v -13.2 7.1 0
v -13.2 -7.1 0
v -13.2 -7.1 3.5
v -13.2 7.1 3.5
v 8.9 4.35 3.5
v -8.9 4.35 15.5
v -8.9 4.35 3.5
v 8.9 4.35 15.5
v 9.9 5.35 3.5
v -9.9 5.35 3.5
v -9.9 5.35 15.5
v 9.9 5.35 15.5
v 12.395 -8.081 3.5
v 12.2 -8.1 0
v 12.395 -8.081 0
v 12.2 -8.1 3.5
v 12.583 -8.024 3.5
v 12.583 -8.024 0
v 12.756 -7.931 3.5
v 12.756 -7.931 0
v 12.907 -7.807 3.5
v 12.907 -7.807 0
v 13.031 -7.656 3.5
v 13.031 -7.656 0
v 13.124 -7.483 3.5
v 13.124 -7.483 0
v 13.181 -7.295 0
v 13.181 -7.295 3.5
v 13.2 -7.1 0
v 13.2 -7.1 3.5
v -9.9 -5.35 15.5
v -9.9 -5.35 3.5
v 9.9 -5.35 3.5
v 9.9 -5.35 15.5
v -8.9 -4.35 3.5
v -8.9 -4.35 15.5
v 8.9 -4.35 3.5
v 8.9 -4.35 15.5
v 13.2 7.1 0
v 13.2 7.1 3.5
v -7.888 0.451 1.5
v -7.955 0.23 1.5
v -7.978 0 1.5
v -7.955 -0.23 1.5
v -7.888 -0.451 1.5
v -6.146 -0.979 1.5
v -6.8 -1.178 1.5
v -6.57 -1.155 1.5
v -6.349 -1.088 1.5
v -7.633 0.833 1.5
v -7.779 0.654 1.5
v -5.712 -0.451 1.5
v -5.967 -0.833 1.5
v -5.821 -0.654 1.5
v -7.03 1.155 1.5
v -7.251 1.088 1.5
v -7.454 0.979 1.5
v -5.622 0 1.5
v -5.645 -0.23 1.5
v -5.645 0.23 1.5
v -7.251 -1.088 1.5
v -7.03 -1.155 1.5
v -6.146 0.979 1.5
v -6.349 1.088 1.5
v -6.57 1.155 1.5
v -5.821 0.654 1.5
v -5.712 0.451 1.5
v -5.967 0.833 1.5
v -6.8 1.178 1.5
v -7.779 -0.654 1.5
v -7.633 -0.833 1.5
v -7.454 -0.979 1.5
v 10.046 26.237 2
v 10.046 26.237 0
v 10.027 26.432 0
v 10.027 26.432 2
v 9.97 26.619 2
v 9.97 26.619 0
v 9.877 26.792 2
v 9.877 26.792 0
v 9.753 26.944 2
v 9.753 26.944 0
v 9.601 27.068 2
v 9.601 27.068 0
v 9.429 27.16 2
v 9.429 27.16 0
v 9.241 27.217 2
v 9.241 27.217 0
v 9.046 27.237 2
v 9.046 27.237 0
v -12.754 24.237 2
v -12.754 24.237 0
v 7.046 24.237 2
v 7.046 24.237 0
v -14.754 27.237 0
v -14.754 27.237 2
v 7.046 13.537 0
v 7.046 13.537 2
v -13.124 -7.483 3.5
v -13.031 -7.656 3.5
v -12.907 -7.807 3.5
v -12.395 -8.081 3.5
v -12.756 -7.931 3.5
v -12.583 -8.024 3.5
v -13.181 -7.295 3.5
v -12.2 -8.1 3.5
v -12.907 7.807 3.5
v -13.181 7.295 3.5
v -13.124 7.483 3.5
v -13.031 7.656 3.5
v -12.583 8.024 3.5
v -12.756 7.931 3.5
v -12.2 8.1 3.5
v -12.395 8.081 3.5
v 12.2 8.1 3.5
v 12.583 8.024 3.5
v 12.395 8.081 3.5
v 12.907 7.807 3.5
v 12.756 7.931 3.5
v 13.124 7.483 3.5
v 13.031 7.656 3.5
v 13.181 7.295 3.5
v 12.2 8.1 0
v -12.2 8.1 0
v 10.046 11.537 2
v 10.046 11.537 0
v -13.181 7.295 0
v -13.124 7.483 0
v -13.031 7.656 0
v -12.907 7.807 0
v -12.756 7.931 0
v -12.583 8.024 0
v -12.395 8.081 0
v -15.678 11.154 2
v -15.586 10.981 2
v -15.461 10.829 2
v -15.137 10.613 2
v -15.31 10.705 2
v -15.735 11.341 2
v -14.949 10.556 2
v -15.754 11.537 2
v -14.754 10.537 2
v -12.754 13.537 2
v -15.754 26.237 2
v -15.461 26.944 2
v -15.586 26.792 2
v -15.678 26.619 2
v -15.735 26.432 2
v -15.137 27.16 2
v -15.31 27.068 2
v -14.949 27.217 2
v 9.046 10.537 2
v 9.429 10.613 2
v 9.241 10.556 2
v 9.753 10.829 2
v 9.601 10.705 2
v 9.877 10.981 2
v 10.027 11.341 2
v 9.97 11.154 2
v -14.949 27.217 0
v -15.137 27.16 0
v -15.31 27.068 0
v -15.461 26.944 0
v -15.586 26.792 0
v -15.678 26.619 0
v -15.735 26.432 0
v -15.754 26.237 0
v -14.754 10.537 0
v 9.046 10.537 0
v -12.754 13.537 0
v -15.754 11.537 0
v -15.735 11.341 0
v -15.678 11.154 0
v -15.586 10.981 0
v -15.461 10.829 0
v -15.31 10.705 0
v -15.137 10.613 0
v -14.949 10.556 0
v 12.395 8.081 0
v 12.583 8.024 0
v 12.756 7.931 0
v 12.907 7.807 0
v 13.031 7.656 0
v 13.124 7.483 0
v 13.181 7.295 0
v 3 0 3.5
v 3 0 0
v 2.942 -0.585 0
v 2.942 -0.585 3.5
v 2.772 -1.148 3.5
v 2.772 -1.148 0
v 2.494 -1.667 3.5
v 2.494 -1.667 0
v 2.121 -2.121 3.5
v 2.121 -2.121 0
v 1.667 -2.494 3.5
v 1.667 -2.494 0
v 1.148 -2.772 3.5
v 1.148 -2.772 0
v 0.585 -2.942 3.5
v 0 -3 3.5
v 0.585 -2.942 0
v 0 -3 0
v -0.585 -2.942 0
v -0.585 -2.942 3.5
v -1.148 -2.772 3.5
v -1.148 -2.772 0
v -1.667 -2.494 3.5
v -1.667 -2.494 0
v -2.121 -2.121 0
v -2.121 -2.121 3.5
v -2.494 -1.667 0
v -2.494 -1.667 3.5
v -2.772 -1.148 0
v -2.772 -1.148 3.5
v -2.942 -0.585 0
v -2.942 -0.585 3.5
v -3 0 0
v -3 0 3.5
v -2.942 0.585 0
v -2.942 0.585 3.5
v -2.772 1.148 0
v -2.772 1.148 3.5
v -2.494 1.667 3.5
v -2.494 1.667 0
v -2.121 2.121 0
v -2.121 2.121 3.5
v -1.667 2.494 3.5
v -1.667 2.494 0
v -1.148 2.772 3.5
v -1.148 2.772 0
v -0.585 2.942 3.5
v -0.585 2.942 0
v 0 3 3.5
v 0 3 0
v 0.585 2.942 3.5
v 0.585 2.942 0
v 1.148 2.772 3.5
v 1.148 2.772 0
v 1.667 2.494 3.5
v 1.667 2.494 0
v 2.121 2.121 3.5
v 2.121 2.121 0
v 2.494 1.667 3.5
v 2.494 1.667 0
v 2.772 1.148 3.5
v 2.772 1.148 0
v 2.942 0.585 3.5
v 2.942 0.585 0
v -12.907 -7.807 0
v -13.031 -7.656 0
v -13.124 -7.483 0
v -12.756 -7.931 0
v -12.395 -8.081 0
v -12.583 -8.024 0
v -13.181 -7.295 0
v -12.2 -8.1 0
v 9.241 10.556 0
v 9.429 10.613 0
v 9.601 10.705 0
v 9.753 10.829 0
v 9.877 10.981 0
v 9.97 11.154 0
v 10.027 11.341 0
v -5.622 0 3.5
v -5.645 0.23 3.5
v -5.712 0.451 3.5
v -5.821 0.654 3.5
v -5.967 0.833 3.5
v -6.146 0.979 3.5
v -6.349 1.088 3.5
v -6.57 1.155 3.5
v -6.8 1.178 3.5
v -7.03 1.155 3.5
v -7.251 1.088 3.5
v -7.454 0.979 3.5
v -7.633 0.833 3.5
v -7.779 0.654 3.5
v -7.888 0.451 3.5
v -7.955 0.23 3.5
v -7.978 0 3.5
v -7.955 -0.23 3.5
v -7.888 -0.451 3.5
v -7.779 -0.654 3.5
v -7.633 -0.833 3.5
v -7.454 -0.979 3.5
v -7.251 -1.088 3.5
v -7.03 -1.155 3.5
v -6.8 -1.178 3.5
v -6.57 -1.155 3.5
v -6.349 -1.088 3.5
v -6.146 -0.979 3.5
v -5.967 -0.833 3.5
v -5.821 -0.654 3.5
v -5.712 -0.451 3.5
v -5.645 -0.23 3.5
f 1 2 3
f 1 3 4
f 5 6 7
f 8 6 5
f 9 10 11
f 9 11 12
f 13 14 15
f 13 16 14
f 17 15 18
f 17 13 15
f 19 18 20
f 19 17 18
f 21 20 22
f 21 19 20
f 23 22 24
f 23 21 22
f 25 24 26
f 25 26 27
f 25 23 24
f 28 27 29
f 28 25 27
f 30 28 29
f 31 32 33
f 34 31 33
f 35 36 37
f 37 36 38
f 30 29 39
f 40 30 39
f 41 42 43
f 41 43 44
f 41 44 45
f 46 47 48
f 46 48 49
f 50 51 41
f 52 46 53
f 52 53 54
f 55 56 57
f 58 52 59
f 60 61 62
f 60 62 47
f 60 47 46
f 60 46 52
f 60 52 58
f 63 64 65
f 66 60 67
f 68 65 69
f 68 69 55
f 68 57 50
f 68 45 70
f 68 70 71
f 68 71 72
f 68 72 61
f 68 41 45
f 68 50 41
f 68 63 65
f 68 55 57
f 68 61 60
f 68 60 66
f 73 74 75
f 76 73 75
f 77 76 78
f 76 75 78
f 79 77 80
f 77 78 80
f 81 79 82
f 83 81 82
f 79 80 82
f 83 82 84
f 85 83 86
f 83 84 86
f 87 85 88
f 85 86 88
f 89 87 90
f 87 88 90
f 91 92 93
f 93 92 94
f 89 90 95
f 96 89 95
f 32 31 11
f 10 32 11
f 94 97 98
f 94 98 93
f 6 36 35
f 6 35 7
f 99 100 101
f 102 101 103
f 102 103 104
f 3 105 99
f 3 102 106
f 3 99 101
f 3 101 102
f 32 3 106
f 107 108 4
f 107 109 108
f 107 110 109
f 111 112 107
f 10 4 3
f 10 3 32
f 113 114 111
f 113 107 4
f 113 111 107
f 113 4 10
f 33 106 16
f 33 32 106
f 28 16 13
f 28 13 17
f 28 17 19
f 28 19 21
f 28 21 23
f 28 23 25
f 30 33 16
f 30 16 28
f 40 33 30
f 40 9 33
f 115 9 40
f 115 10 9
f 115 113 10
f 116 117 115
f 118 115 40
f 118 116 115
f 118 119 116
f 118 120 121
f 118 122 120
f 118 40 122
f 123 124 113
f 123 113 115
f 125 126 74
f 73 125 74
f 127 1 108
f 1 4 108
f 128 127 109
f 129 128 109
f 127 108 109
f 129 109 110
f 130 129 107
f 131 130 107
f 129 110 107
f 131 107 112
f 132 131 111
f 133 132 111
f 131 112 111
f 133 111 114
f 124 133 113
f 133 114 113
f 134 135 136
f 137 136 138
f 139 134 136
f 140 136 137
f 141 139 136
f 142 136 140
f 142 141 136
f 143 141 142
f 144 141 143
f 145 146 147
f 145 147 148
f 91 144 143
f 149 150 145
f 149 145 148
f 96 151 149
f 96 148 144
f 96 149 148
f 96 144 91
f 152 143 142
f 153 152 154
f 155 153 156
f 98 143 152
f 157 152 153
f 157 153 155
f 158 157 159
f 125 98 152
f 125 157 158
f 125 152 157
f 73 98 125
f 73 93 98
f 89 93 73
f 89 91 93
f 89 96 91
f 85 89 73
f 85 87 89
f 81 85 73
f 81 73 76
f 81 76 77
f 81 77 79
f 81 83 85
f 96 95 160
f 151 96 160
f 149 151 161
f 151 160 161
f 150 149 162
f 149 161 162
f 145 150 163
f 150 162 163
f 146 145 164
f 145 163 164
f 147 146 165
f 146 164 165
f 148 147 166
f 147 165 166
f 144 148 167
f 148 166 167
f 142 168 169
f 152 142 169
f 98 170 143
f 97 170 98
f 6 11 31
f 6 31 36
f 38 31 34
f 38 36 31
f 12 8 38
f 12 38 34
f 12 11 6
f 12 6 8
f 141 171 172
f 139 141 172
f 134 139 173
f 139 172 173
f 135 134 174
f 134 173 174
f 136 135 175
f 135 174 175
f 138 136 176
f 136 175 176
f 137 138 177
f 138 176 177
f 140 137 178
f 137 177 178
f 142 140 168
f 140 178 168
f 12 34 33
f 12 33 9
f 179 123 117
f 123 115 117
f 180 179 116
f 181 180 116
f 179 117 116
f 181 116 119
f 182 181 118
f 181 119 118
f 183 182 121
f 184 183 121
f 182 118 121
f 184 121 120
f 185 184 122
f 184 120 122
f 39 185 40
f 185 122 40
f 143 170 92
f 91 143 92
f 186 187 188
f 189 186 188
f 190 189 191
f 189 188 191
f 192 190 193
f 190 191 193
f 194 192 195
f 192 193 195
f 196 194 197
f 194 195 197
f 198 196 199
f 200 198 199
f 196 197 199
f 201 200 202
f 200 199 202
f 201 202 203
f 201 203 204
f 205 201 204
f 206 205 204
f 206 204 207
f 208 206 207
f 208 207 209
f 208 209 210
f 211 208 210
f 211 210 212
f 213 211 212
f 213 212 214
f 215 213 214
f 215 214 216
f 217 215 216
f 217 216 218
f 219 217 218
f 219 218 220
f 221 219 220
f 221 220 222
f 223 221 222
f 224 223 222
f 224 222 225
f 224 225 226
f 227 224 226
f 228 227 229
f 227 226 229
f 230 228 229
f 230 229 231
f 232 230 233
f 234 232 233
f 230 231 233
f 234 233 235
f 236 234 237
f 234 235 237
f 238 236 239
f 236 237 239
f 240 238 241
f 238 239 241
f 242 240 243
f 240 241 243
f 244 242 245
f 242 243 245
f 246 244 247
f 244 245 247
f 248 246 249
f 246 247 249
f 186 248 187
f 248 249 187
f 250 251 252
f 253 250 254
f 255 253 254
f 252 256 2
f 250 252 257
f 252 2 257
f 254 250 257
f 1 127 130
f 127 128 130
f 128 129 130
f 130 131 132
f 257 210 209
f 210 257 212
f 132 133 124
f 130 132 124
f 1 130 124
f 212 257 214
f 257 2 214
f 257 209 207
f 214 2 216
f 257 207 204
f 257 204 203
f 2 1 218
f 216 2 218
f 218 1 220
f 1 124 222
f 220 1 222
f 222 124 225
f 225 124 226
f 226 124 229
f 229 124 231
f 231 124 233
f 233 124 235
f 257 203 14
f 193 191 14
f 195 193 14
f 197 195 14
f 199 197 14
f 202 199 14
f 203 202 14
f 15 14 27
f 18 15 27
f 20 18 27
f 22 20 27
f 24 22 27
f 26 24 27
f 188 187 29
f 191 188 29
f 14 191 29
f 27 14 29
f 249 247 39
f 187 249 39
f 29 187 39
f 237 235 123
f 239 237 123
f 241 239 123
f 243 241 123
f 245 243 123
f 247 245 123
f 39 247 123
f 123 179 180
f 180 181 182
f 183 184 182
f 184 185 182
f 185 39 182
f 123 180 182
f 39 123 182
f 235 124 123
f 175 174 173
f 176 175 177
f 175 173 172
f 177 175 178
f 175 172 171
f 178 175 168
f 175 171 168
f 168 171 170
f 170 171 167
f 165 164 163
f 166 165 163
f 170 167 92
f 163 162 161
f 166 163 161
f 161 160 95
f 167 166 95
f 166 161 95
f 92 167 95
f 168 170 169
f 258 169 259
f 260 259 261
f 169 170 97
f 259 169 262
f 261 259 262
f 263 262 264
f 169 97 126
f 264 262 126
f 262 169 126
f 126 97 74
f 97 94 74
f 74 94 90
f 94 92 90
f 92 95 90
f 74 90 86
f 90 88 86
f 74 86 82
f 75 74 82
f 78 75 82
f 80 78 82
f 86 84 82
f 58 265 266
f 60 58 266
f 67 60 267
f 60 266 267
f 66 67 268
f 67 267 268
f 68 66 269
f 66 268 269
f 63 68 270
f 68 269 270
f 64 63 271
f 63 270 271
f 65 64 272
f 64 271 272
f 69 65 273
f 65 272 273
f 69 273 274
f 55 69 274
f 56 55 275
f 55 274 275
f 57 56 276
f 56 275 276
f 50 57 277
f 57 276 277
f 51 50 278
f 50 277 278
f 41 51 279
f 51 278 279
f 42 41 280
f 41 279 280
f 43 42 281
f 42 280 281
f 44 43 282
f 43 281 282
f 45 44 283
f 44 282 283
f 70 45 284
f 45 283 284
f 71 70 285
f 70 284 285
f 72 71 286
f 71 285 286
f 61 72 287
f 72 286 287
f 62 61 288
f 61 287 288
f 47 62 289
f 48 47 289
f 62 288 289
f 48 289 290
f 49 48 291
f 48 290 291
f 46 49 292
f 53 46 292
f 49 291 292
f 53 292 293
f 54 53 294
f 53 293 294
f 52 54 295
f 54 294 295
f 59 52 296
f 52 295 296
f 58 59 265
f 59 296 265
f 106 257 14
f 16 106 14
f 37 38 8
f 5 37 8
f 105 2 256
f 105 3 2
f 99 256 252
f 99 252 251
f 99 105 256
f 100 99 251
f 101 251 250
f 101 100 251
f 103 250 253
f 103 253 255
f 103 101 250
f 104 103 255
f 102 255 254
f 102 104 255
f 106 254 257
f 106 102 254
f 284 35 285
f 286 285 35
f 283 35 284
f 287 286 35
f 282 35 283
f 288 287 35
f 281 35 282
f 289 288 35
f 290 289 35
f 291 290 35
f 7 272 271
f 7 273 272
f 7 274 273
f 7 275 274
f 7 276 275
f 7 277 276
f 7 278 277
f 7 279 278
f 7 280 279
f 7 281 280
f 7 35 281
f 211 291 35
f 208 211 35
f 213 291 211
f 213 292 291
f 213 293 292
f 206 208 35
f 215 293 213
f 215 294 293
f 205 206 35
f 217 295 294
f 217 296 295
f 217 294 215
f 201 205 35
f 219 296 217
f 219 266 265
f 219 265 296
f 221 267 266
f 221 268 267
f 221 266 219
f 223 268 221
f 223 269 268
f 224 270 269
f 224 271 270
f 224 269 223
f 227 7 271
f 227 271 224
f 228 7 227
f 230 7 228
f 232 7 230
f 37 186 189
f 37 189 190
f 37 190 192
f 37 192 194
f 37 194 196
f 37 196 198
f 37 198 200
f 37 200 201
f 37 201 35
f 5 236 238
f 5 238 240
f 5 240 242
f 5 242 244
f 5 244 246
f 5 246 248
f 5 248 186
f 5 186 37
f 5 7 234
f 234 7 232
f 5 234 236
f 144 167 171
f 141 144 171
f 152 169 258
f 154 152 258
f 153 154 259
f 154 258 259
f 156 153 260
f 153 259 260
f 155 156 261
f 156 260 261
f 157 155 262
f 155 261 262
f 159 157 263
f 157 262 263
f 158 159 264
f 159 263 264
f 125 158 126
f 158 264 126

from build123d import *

# Parameters (mm, degrees)
F0_W       = 26.4
F0_H       = 16.2
F1_DEPTH   = 3.5
F2_W       = 19.8
F2_H       = 10.7
F3_DEPTH   = 12
F4_W       = 17.8
F4_H       = 8.7
F5_DEPTH   = 12
F6_R       = 3
F7_DEPTH   = 25
F8_R       = 1
F1_FACE1_R = 3
F9_R       = 1.1777908887
F10_DEPTH  = 2
F11_W      = 19.8
F11_H      = 10.7
F12_DEPTH  = 2


with BuildPart() as f1:
    # F0 (on Top) → F1 (new body)
    with BuildSketch(Plane.XY):
        Rectangle(F0_W, F0_H)
    extrude(amount=F1_DEPTH)

    # F2 (on face) → F3 (join)
    with BuildSketch(Plane.XY.offset(3.5)):
        Rectangle(F2_W, F2_H)
    extrude(amount=F3_DEPTH)

    # F4 (on face) → F5 (cut)
    with BuildSketch(Plane.XY.offset(15.5)):
        Rectangle(F4_W, F4_H)
    extrude(amount=-F5_DEPTH, mode=Mode.SUBTRACT)

    # F6 (on face) → F7 (cut)
    with BuildSketch(Plane(origin=(0, 0, 0), x_dir=(1, 0, 0), z_dir=(0, 0, -1))):
        Circle(F6_R)
    extrude(amount=-F7_DEPTH, mode=Mode.SUBTRACT)

    # F8
    f8_edges = [f1.edges().sort_by_distance(p)[0] for p in [
        (13.2, 8.1, 1.75),
        (13.2, -8.1, 1.75),
        (-13.2, 8.1, 1.75),
        (-13.2, -8.1, 1.75),
    ]]
    fillet(f8_edges, radius=F8_R)

    # F1_face1 (on face) + F9 (on face) → F10 (cut)
    with BuildSketch(Plane(origin=(0, 0, 0), x_dir=(1, 0, 0), z_dir=(0, 0, -1))):
        with BuildLine():
            Line((-12.2, -8.1), (12.2, -8.1))
            ThreePointArc((12.2, -8.1), (12.9071067812, -7.8071067812), (13.2, -7.1))
            Line((13.2, -7.1), (13.2, 7.1))
            ThreePointArc((13.2, 7.1), (12.9071067812, 7.8071067812), (12.2, 8.1))
            Line((12.2, 8.1), (-12.2, 8.1))
            ThreePointArc((-12.2, 8.1), (-12.9071067812, 7.8071067812), (-13.2, 7.1))
            Line((-13.2, 7.1), (-13.2, -7.1))
            ThreePointArc((-13.2, -7.1), (-12.9071067812, -7.8071067812), (-12.2, -8.1))
        make_face()
        Circle(F1_FACE1_R, mode=Mode.SUBTRACT)
    with BuildSketch(Plane.XY.offset(3.5)):
        with Locations((-6.8, 0)):
            Circle(F9_R)
    extrude(amount=F10_DEPTH, dir=(0, 0, -1), mode=Mode.SUBTRACT)


with BuildPart() as f12:
    # F11 (on Top) → F12 (new body)
    with BuildSketch(Plane.XY):
        with BuildLine():
            Line((9.0459102817, 27.2365642995), (-14.7540897183, 27.2365642995))
            ThreePointArc((-14.7540897183, 27.2365642995), (-15.4611964995, 26.9436710807), (-15.7540897183, 26.2365642995))
            Line((-15.7540897183, 26.2365642995), (-15.7540897183, 11.5365642995))
            ThreePointArc((-15.7540897183, 11.5365642995), (-15.4611964995, 10.8294575183), (-14.7540897183, 10.5365642995))
            Line((-14.7540897183, 10.5365642995), (9.0459102817, 10.5365642995))
            ThreePointArc((9.0459102817, 10.5365642995), (9.7530170629, 10.8294575183), (10.0459102817, 11.5365642995))
            Line((10.0459102817, 11.5365642995), (10.0459102817, 26.2365642995))
            ThreePointArc((10.0459102817, 26.2365642995), (9.7530170629, 26.9436710807), (9.0459102817, 27.2365642995))
        make_face()
        with Locations((-2.8540897183, 18.8865642995)):
            Rectangle(F11_W, F11_H, mode=Mode.SUBTRACT)
    extrude(amount=F12_DEPTH)


solid = Compound([f1.part, f12.part])
